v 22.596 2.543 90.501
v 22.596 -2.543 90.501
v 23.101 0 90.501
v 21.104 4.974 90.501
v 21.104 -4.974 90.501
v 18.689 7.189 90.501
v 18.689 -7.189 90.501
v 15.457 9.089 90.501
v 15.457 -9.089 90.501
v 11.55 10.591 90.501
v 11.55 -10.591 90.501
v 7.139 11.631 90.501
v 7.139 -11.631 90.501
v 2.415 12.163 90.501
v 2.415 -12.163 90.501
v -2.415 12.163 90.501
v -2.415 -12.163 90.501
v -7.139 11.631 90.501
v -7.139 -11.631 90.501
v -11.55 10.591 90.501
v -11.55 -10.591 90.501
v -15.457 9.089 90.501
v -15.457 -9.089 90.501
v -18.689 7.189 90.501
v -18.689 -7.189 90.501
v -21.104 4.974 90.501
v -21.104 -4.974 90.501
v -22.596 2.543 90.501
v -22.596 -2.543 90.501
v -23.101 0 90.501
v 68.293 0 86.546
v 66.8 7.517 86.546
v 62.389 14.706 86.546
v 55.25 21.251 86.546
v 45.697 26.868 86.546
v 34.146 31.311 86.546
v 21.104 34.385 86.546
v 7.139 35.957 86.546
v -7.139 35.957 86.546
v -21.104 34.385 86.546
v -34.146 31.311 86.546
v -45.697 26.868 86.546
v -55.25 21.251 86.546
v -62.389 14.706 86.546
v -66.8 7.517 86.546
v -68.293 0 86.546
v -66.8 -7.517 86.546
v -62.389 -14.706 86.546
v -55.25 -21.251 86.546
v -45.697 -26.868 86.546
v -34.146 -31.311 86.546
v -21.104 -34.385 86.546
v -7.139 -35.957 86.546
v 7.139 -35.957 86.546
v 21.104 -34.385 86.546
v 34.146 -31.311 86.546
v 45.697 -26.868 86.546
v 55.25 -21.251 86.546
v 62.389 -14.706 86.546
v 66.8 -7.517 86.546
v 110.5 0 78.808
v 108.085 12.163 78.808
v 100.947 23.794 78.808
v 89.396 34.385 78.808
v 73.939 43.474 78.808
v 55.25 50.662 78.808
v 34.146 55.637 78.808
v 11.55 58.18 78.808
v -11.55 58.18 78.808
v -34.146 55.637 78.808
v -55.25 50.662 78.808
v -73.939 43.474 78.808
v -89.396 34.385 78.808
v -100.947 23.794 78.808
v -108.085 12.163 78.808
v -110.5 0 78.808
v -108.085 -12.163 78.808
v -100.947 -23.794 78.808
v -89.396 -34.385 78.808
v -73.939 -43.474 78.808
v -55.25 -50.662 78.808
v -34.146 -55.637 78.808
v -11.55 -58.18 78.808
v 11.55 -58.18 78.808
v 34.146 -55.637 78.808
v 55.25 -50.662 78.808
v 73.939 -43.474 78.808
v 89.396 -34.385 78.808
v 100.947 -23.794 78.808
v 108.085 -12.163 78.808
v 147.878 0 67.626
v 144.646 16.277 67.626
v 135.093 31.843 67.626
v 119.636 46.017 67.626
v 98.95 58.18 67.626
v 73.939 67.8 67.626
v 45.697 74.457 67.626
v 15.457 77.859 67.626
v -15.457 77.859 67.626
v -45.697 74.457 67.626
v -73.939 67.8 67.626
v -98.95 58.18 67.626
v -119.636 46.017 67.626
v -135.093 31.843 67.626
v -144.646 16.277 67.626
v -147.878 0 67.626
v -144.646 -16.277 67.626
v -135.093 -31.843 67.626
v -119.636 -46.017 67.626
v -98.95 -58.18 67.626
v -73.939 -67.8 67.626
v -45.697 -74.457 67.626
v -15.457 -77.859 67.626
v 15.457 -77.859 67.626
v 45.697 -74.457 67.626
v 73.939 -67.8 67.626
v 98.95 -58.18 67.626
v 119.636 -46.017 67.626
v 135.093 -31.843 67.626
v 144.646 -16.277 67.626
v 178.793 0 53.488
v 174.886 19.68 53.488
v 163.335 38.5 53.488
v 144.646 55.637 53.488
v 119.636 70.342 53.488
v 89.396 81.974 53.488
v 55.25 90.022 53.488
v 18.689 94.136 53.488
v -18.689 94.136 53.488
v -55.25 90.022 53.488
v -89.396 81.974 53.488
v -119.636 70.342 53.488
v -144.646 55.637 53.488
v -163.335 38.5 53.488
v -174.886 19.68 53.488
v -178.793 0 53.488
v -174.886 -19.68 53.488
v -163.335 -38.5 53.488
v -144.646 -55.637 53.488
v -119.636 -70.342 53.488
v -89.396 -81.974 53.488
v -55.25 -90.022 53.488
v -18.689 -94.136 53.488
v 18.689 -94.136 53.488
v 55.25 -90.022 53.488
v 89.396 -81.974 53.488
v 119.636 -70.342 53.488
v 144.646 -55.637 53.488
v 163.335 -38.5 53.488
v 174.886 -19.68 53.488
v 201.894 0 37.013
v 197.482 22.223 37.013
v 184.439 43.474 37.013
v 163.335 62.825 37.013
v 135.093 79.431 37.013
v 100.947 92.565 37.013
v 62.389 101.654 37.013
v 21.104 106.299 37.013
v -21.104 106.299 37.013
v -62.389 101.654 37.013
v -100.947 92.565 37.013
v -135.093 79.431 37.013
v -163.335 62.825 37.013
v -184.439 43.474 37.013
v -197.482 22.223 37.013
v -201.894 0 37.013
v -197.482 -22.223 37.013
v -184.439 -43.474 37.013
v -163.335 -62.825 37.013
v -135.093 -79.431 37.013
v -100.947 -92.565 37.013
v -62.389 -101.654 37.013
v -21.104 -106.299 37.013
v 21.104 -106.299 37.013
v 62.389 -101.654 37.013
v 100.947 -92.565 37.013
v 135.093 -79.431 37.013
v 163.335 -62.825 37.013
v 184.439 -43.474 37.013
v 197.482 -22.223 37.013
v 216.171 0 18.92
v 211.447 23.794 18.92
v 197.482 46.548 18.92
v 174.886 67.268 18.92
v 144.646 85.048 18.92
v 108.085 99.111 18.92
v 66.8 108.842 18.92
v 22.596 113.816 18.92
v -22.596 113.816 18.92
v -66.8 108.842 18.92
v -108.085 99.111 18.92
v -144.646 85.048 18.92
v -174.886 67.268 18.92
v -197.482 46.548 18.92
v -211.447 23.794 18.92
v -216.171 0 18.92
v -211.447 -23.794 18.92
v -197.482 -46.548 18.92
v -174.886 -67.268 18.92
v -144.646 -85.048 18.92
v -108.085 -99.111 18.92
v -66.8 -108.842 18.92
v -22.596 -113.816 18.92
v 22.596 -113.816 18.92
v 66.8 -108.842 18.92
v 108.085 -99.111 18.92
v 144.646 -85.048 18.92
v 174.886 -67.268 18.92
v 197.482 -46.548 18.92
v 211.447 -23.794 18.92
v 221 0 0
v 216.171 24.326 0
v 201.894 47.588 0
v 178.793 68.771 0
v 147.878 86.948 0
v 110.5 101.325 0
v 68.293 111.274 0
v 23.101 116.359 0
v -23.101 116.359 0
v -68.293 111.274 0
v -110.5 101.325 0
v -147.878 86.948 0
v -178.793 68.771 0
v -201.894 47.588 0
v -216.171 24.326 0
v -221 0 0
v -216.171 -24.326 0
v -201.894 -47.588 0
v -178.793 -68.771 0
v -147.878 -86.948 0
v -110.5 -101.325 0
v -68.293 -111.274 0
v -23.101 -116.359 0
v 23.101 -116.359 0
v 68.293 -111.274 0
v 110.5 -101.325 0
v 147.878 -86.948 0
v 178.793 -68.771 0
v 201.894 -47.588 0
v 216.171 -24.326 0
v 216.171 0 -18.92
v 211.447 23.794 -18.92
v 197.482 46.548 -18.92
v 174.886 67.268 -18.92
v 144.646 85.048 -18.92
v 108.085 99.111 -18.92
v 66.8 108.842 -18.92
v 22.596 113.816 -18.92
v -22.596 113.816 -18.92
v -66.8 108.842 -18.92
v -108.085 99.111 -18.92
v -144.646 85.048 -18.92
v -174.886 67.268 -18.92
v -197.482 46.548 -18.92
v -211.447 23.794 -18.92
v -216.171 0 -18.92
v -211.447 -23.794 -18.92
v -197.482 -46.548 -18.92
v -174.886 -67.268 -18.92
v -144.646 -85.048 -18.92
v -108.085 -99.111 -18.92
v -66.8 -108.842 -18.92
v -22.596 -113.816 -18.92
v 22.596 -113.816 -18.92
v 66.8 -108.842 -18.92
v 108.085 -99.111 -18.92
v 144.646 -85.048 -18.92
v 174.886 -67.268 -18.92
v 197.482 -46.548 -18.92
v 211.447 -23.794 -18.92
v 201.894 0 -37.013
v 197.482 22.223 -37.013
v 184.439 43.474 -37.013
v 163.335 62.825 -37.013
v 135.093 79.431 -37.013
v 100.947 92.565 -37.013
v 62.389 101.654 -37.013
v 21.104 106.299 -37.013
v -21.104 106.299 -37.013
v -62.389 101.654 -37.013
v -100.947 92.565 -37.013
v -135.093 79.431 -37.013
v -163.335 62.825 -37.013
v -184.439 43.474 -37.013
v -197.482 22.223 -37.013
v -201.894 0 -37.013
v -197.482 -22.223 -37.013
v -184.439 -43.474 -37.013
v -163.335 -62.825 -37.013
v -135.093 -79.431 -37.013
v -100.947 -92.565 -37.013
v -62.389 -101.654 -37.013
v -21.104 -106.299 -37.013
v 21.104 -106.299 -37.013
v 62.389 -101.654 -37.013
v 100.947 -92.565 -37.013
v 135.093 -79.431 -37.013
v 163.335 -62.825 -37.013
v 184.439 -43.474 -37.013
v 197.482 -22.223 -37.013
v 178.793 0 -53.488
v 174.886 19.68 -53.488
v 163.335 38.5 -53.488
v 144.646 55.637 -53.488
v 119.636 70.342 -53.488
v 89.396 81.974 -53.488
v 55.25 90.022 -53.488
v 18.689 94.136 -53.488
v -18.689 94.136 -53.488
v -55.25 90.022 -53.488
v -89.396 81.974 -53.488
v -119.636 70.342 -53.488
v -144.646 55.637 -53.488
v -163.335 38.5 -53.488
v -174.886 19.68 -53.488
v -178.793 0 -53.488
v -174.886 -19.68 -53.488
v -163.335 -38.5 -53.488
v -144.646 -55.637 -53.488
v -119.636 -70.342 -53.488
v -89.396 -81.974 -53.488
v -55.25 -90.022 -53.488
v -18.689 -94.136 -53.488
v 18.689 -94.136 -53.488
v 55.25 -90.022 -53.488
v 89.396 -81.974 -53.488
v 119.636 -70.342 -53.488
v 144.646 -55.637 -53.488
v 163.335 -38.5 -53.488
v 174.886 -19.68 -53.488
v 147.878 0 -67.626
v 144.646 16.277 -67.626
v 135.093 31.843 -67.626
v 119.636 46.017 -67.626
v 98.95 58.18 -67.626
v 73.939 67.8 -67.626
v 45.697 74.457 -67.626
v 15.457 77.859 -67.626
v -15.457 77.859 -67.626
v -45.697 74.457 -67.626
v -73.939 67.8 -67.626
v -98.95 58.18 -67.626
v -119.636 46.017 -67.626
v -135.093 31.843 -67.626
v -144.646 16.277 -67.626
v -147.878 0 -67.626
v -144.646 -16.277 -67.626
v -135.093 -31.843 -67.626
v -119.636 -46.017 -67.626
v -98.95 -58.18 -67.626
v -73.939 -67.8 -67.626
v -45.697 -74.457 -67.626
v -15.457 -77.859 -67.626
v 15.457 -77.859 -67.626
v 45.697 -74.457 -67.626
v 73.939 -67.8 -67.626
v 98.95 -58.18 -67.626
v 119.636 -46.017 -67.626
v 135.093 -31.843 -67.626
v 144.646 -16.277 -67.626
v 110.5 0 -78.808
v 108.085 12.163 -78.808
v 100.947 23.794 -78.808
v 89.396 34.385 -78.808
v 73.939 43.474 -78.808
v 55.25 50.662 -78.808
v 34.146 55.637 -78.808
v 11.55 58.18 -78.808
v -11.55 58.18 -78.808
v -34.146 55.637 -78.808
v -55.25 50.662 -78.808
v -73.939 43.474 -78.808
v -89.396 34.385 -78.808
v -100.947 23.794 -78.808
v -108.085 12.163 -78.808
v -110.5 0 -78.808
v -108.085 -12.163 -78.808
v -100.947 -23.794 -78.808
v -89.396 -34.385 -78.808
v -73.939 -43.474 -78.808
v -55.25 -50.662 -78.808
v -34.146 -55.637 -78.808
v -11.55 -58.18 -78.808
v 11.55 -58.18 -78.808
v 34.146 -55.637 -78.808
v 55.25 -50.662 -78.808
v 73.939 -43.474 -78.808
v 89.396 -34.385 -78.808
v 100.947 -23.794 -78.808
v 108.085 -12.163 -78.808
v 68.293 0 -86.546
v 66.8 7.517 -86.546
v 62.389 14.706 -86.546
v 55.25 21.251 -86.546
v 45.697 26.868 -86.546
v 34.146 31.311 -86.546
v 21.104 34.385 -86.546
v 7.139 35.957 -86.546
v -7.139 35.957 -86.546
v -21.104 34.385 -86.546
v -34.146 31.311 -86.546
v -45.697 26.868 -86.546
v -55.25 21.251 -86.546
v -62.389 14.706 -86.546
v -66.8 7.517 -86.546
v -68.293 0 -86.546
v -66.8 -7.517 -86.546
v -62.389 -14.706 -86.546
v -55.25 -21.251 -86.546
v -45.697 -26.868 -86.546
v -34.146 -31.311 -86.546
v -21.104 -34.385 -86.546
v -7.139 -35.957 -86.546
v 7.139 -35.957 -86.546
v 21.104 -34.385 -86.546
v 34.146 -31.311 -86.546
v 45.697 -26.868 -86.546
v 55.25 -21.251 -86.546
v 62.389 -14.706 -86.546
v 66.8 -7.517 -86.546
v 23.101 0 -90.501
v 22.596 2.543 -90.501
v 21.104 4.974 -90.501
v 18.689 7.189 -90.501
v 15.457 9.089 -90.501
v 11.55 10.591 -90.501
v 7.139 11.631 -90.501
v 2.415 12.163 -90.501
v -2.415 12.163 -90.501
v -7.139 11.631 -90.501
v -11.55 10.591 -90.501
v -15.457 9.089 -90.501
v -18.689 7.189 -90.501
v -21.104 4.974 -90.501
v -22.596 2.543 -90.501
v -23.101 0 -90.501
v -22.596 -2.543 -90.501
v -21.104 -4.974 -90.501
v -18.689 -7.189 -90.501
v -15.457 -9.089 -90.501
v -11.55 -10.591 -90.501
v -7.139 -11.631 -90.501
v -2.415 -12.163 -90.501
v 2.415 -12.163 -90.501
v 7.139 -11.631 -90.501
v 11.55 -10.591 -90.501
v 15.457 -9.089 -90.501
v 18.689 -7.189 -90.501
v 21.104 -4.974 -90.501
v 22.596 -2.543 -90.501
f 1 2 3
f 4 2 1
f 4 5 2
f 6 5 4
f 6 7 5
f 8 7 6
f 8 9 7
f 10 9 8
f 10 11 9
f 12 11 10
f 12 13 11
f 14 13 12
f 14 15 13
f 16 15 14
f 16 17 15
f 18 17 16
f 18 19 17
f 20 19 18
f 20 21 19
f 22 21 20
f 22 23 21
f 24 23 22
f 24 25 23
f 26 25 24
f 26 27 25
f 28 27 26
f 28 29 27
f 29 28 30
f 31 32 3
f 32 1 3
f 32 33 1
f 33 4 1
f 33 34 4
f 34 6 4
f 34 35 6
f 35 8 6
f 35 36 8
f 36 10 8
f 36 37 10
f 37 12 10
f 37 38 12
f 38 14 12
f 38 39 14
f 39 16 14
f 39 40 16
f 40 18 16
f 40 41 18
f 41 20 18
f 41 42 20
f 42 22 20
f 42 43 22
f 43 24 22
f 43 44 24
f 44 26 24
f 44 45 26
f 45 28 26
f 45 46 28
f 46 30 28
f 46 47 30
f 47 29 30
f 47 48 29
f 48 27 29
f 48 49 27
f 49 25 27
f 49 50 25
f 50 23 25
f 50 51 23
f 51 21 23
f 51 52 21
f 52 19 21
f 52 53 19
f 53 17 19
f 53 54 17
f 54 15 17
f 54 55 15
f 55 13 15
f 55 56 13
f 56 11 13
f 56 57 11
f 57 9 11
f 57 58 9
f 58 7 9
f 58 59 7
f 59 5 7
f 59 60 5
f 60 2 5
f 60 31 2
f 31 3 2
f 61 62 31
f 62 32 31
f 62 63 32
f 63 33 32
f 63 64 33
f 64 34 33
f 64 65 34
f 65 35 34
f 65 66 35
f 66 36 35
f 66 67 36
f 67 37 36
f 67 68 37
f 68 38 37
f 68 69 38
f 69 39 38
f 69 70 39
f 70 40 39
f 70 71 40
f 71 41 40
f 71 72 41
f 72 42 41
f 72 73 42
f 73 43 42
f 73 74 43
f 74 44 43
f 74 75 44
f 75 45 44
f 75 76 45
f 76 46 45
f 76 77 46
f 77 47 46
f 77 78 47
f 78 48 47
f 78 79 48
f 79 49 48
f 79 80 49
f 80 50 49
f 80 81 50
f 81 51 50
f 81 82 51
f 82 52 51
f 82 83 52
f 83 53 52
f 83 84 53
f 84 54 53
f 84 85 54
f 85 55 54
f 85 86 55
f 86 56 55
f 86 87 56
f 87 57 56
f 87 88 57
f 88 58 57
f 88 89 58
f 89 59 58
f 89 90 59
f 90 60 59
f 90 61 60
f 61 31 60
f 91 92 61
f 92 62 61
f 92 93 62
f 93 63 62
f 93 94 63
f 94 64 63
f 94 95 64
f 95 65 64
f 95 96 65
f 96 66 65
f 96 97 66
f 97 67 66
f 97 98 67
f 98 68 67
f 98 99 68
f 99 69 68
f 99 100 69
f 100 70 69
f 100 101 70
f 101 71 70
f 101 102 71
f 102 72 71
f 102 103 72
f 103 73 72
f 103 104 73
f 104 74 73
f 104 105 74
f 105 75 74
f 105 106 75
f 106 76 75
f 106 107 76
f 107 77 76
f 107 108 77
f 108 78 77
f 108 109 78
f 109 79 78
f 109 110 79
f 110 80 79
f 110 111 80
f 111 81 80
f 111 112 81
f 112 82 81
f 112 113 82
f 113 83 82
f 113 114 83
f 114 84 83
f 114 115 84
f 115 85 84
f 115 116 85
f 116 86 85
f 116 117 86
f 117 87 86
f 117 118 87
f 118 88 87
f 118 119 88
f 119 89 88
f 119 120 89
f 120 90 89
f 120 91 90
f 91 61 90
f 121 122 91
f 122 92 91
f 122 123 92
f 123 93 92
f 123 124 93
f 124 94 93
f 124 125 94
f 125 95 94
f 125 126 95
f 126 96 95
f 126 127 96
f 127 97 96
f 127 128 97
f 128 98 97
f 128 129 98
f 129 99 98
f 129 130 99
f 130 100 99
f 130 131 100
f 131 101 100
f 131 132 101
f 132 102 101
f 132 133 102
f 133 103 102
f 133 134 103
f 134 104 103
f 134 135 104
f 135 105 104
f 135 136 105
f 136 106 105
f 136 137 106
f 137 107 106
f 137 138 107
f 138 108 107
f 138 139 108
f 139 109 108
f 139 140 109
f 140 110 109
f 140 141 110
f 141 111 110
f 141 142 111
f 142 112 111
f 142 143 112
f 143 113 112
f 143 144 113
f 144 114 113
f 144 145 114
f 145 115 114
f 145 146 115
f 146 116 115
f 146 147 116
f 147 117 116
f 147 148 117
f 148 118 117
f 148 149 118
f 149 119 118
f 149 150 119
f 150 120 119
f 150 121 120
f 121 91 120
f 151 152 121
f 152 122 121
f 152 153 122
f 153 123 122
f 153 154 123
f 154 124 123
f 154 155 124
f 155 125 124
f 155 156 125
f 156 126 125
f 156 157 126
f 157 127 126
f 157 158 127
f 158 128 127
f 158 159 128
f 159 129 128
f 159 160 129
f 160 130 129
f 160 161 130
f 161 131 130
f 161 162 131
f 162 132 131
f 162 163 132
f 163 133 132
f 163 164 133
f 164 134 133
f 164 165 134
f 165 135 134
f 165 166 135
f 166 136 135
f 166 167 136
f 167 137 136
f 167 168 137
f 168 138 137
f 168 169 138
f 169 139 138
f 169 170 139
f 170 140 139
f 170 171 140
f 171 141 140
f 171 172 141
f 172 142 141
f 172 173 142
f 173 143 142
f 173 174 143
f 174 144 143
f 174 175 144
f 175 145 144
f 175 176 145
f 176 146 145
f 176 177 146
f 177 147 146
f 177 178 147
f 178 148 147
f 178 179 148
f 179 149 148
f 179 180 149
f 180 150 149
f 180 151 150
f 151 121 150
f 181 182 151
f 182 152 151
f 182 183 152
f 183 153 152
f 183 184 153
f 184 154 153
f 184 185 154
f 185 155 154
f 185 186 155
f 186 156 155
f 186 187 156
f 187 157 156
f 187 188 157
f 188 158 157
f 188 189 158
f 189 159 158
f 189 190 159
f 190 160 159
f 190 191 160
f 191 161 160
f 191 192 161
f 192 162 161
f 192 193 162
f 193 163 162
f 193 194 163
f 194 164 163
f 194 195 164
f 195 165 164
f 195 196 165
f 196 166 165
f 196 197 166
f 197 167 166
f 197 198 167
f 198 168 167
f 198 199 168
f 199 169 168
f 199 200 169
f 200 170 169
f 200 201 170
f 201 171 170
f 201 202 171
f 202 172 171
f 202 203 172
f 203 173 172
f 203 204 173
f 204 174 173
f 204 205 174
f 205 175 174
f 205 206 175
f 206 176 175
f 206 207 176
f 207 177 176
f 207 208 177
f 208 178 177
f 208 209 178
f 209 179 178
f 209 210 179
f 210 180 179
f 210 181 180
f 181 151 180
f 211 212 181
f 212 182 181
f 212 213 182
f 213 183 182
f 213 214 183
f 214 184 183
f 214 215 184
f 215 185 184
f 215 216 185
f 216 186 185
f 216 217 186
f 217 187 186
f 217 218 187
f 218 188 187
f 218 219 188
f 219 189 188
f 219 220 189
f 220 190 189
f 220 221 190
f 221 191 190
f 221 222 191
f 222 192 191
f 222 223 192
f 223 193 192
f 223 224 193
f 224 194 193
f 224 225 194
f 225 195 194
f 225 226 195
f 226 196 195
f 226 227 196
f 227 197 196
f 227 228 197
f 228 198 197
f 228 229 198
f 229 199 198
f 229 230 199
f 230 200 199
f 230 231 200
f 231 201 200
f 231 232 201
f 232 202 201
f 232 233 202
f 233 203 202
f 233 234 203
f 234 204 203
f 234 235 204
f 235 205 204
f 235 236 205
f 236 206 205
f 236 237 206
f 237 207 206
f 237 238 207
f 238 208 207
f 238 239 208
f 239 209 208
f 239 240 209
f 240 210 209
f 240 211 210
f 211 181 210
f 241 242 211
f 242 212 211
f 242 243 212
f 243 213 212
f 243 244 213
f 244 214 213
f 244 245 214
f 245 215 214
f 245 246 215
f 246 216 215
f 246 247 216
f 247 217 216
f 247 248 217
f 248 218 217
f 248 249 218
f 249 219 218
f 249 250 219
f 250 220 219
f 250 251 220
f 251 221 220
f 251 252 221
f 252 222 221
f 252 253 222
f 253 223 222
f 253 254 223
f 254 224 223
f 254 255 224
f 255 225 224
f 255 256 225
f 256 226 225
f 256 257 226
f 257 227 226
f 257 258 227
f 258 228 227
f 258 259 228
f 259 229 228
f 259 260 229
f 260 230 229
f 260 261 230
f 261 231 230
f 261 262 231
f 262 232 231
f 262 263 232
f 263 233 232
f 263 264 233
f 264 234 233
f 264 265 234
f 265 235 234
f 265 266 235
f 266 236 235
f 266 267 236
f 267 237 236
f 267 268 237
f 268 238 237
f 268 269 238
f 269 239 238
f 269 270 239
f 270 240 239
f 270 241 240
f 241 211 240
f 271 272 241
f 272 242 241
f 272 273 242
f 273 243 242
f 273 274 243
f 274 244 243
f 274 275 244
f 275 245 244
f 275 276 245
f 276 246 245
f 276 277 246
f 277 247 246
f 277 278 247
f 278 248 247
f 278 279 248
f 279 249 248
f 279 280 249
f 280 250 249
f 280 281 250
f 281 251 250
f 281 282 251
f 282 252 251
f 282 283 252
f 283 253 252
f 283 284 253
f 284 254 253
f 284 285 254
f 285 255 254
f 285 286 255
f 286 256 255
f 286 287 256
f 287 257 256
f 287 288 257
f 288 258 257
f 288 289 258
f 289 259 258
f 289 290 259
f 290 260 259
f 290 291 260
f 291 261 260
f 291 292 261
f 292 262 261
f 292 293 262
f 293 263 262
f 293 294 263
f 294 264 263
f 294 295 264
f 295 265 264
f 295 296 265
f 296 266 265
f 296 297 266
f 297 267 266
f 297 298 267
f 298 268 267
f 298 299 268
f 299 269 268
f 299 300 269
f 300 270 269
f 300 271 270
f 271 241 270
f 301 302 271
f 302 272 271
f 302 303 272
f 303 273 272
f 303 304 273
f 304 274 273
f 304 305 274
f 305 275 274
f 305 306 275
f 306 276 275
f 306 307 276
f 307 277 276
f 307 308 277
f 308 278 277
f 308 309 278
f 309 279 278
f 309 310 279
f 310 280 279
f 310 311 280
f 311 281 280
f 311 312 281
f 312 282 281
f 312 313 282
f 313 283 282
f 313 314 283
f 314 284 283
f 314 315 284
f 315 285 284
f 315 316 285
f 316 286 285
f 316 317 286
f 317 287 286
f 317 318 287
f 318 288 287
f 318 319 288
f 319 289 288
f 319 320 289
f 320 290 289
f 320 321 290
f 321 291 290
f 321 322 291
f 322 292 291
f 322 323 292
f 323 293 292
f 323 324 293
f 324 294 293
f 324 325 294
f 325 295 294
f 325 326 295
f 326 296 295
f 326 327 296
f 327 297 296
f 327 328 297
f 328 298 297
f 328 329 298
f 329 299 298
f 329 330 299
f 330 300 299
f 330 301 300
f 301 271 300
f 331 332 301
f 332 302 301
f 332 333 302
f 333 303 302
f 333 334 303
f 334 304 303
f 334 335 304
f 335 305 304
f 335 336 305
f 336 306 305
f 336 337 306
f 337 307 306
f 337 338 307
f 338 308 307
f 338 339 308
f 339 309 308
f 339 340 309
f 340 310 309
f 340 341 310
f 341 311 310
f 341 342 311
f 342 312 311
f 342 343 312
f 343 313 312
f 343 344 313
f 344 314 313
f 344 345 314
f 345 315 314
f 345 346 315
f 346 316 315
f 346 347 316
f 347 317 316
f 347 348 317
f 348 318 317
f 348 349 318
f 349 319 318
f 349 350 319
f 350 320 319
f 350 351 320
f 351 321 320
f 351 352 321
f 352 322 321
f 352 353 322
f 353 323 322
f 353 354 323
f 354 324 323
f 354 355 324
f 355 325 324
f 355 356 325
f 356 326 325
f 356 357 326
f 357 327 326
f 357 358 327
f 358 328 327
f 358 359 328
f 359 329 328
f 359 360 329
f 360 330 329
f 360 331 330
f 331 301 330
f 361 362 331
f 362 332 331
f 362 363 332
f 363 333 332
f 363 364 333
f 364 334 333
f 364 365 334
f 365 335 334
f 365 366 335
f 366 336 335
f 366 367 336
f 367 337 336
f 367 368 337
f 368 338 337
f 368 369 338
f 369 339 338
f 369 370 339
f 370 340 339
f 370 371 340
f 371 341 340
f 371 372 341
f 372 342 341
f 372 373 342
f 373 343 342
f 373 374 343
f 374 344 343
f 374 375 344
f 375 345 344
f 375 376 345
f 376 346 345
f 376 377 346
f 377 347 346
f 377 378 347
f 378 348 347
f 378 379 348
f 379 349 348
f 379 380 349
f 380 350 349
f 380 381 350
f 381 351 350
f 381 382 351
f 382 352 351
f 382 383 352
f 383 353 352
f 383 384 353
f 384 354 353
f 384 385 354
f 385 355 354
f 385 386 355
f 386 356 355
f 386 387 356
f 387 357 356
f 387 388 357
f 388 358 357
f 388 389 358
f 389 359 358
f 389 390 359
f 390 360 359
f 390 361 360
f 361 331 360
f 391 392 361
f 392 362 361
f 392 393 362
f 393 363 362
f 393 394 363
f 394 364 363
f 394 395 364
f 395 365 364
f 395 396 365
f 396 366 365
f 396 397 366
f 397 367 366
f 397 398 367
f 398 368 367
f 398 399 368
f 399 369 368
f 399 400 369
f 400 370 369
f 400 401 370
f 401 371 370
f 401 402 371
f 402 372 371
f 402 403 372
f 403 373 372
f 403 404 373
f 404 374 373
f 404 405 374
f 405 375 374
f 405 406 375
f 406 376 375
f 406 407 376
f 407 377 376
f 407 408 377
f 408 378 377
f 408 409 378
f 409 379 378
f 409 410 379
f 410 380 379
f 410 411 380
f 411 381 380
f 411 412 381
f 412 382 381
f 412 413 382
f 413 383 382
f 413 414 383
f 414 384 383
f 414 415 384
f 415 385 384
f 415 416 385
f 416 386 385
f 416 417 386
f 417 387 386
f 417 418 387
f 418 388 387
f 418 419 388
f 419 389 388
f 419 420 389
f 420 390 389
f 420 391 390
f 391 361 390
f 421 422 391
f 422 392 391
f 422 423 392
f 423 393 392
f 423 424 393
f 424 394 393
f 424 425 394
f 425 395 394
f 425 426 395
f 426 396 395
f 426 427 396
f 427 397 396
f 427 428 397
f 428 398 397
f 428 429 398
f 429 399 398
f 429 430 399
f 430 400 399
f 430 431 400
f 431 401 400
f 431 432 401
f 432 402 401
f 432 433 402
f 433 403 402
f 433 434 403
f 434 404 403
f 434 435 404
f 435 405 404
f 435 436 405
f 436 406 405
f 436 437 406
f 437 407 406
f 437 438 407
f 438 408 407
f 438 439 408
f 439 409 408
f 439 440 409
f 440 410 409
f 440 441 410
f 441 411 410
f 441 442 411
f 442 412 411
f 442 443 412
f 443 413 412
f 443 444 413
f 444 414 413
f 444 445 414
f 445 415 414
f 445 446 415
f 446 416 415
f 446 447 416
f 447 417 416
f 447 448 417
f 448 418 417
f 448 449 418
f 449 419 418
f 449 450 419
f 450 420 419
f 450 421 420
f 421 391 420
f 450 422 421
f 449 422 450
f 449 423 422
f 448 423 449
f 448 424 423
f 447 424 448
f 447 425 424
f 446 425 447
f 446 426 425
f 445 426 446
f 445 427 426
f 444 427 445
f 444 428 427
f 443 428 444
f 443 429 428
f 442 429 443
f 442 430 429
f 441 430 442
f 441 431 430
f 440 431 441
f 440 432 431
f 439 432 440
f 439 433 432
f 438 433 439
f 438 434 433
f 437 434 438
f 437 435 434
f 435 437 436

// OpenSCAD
// Generated by SolidPython 1.0.1 on 2020-07-29 00:46:53


scale(v = [17, 9, 7]) {
	sphere(r = 13);
}
/***********************************************
*********      SolidPython code:      **********
************************************************
 
# import packages: SolidPython
from solid import *
from solid.utils import *
from itertools import chain, combinations, permutations


class Resize:

    def __init__(self, scad_file):
        self.scad_file = scad_file
        #self.scad_file = import_scad(scad_file)
        # cone/cylinder param:
        self.r1 = 0
        self.r2 = 0
        self.h = 0
        # rectangular prism param:
        self.w = 0
        self.l = 0
        # ellipse param:
        self.r = 0

    # import OpenScad code (file name corresponds to shape)


    # classify shape + parameters
    def assign(self, param1, param2, param3):
        if self.scad_file == 'cone.scad':
            self.r1 = param1
            self.r2 = param2
            self.h = param3
        elif self.scad_file == 'cylinder.scad':
            self.r1 = param1
            self.r2 = param2
            self.h = param3
        elif self.scad_file == 'rectangularPrism.scad':
            self.h = param1
            self.l = param2
            self.w = param3
        else:
            self.r = param1
            self.h = param2

    # resize parameters
    def iterate(self):
        x = range(3, 20, 2)
        i = 1
        if self.scad_file == 'cone.scad':
            tempList = list(permutations(x, 2))
            for temp in tempList:
                param1 = temp[0]
                param2 = temp[1]
                filepath = 'produced_scad_files/' + 'cone' + str(param1) + '_' + str(param2) + '_' + '.scad'
                scad_render_to_file(cylinder(h=param1, r1=param2, r2=0), filepath)

        elif self.scad_file == 'cylinder.scad':
            tempList = list(permutations(x, 3))
            for temp in tempList:
                param1 = temp[0]
                param2 = temp[1]
                filepath = 'produced_scad_files/' + 'cylinder' + str(param1) + '_' + str(param2) + '_' + '.scad'
                scad_render_to_file(cylinder(h=param1, r1=param2, r2=param2), filepath)

        elif self.scad_file == 'rectangularPrism.scad':
            tempList = list(permutations(x, 3))
            for temp in tempList:
                param1 = temp[0]
                param2 = temp[1]
                param3 = temp[2]
                filepath = 'produced_scad_files/' + 'rectangularPrism' + str(param1) + '_' + str(param2) + '_' + str(
                    param3) + '.scad'
                scad_render_to_file(cube(size=(param1, param2, param3)), filepath)

        elif self.scad_file == 'ellipse.scad':
            tempList = list(permutations(x, 4))
            for temp in tempList:
                param1 = temp[0]
                param2 = temp[1]
                param3 = temp[2]
                param4 = temp[3]
                filepath = 'produced_scad_files/' + 'ellipse' + str(param1) + '_' + str(param2) + '_' + str(param3) + '_' + str(param4) + '.scad'
                scad_render_to_file(scale([param1, param2, param3])(sphere(r=param4)), filepath)

    def render_to_scadfile(self):
        scad_render_to_file(scad, 'example.scad') 
 
************************************************/
